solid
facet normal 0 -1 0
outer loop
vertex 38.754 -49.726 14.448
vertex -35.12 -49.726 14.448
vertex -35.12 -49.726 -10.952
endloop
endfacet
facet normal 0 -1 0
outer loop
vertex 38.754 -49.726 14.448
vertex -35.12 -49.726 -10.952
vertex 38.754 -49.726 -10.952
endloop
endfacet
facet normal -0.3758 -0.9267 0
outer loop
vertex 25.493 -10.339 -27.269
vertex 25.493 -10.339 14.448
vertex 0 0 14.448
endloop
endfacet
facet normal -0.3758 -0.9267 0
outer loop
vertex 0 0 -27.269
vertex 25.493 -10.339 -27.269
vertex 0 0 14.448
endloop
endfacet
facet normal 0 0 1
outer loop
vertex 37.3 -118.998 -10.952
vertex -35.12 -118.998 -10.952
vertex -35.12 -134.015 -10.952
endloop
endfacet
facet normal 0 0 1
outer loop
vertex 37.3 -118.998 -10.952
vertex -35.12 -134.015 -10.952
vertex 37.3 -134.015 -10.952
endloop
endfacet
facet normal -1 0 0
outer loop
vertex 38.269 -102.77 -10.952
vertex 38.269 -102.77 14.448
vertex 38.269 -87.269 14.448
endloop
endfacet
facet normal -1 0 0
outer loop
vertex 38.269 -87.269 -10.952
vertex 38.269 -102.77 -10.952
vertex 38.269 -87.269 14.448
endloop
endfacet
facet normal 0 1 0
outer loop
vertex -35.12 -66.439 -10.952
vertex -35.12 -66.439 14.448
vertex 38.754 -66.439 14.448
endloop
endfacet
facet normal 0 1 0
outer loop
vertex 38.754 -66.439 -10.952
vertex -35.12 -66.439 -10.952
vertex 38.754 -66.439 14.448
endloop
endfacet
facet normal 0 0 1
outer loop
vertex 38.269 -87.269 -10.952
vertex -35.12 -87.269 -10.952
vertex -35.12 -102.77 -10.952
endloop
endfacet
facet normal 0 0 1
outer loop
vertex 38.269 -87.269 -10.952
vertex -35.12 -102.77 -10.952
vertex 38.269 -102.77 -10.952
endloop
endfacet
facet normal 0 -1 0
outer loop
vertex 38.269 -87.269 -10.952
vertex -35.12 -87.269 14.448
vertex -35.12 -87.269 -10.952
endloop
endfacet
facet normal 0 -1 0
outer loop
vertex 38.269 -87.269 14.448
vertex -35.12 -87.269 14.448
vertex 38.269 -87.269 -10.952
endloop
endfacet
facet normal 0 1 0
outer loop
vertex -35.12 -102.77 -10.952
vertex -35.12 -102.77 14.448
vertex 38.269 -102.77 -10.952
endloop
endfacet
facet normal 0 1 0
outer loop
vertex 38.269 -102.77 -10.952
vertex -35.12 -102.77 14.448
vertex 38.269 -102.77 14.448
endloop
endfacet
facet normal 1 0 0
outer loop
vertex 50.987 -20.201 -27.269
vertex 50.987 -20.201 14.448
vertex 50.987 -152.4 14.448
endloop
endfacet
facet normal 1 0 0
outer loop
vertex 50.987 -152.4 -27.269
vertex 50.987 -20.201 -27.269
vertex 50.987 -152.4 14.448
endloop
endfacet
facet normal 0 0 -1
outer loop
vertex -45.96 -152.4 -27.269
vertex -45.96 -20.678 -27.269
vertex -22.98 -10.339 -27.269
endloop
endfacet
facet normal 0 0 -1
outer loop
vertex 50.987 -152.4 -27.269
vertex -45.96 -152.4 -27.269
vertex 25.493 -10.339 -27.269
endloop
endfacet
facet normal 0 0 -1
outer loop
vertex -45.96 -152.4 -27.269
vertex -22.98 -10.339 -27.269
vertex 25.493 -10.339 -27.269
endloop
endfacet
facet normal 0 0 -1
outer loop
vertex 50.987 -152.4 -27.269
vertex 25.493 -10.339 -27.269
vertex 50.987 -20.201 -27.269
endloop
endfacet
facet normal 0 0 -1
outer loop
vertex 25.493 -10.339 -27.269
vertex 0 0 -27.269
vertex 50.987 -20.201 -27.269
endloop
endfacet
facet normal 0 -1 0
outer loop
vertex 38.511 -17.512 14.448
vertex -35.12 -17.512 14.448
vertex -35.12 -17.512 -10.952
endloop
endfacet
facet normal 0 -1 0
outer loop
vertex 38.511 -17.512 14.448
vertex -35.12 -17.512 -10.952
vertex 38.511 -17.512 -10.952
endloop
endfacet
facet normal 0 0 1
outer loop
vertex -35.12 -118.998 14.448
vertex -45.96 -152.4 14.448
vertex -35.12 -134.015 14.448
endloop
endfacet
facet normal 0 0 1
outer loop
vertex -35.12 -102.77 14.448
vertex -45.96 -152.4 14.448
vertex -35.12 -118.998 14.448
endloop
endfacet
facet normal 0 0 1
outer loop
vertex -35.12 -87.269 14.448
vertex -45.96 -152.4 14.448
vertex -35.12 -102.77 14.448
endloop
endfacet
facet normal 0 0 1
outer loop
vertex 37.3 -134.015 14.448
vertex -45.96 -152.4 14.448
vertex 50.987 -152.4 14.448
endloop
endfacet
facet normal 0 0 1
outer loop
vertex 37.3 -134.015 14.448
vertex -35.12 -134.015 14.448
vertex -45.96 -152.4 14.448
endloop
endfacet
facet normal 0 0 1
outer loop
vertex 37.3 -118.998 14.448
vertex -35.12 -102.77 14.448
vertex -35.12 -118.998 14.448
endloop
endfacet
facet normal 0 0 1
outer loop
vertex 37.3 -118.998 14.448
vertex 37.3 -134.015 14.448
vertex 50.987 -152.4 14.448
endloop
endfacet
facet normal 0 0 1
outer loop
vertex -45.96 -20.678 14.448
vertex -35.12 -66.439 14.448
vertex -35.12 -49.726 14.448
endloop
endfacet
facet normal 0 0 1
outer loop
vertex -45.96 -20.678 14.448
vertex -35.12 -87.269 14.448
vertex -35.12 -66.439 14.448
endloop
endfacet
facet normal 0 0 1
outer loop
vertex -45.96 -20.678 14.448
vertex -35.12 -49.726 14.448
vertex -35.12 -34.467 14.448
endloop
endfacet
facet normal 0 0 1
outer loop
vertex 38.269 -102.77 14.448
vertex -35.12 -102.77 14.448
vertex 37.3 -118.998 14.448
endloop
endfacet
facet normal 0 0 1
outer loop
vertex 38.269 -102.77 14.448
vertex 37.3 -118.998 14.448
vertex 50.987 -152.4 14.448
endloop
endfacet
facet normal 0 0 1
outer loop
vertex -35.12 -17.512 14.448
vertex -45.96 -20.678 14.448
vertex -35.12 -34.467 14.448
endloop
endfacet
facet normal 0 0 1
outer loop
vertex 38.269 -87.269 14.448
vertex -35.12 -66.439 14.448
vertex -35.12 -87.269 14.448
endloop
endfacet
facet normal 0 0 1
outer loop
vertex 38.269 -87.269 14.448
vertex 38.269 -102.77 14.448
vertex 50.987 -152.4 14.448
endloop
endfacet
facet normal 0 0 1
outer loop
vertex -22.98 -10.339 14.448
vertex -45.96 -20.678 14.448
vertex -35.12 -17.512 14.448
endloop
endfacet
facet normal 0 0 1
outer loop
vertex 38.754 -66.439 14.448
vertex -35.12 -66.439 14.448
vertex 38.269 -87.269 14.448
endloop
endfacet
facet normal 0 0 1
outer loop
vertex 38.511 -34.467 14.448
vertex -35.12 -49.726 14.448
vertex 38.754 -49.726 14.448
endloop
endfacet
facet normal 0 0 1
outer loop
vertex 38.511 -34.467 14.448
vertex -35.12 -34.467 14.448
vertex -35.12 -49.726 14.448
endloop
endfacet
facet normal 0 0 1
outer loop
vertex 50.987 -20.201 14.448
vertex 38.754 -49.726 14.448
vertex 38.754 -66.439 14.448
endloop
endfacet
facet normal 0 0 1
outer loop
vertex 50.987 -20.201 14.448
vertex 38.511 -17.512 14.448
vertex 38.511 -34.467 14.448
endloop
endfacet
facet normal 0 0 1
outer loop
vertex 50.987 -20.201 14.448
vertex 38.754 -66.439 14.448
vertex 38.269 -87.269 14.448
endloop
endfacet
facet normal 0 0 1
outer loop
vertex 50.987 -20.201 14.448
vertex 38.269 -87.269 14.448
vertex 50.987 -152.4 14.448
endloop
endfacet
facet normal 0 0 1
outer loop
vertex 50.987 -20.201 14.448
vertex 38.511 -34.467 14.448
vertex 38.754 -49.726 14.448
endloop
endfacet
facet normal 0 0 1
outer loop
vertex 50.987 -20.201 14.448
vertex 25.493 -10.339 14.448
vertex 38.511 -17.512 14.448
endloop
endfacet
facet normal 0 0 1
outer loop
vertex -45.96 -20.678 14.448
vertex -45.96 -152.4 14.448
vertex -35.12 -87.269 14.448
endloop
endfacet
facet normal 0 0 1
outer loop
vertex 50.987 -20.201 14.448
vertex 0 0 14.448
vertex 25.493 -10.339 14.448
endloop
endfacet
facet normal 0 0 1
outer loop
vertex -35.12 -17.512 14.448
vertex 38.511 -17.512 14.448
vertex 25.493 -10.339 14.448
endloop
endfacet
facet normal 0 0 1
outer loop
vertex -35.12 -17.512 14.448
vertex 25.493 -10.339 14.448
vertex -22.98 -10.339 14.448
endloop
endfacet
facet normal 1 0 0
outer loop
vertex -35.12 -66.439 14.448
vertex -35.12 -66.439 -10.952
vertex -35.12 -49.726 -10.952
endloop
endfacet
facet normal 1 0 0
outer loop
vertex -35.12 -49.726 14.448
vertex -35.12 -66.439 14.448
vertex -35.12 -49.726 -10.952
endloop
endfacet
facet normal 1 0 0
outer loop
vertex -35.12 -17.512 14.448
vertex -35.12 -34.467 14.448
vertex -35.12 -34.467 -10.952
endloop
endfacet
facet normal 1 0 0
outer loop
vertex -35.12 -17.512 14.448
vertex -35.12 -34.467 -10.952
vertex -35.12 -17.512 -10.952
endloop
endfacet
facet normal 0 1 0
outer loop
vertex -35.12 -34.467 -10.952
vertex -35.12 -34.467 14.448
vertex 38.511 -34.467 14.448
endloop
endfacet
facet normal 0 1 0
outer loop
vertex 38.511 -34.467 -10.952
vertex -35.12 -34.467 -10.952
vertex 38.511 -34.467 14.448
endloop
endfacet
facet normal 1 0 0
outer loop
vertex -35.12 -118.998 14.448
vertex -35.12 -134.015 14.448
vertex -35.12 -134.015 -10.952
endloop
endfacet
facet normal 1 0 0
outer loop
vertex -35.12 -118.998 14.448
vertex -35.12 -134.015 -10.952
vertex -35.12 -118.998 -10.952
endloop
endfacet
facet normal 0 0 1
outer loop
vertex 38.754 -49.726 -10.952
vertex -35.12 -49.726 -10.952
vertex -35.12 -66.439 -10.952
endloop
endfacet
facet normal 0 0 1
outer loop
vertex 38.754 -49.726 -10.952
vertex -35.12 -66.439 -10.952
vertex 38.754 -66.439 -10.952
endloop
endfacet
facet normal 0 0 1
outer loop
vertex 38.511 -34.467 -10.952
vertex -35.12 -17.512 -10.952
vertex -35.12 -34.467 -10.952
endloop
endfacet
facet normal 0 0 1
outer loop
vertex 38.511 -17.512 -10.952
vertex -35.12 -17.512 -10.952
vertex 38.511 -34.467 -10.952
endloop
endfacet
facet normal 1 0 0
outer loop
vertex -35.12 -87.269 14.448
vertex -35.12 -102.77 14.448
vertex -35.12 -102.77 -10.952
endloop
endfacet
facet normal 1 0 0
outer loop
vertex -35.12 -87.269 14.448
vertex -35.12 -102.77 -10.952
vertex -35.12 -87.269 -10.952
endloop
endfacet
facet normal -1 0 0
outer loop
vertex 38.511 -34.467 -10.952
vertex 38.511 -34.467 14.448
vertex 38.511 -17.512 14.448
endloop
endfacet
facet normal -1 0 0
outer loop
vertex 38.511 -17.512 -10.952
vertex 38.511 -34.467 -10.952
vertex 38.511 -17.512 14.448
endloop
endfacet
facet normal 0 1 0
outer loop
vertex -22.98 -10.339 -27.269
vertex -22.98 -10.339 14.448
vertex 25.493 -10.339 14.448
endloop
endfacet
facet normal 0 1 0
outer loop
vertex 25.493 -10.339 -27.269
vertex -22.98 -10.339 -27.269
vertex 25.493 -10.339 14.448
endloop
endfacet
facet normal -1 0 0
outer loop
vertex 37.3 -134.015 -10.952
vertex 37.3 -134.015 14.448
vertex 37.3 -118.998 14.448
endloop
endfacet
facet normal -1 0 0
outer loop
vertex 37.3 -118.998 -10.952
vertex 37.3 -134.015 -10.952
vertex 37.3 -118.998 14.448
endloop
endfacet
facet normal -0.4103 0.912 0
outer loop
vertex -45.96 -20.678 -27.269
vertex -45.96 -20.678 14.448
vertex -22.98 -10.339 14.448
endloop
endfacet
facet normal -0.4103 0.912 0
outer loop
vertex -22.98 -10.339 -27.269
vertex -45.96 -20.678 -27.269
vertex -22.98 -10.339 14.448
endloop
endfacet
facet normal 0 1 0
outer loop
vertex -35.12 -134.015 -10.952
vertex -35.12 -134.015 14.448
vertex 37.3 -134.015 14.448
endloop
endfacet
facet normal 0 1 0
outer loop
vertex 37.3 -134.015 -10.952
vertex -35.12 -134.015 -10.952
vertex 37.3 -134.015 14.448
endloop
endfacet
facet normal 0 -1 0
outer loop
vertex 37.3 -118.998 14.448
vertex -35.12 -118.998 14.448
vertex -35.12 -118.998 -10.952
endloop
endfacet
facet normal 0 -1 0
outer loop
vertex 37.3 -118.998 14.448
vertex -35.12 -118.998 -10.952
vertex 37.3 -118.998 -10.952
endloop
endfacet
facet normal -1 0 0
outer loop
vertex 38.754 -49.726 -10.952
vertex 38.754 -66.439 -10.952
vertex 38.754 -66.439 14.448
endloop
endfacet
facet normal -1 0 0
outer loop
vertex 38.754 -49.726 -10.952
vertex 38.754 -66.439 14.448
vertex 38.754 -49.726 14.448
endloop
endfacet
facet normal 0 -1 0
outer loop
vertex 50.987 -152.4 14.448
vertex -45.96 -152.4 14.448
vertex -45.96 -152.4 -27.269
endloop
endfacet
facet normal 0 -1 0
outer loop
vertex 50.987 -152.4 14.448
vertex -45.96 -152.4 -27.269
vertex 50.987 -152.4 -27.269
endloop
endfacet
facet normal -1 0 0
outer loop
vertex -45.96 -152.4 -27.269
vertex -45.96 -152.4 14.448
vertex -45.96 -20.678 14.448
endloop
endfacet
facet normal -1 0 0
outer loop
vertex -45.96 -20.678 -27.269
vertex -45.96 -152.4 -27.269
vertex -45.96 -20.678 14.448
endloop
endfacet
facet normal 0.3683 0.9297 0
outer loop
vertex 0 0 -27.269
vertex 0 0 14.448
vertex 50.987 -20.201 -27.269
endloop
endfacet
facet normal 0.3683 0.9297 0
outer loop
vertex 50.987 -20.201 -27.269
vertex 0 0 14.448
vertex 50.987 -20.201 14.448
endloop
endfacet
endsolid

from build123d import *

# Parameters (mm, degrees)
F0_W      = 129.2205303907
F0_H      = 41.7168587446
F1_DEPTH  = 152.4
F2_W      = 73.6317485571
F2_H      = 16.954690218
F2_W_2    = 73.8739818335
F2_H_2    = 16.7124718428
F3_DEPTH  = 25.4
F5_DEPTH  = 41.7178587446
F6_W      = 73.389545083
F6_H      = 15.5014246702
F7_DEPTH  = 25.4
F8_W      = 72.4207013845
F8_H      = 15.017002821
F9_DEPTH  = 25.4
F11_DEPTH = 75.7919326425
F13_DEPTH = 105.4396703839
F15_DEPTH = 137.5292986631


with BuildPart() as f1:
    # F0 (on Front) → F1 (new body)
    with BuildSketch(Plane.XZ):
        with Locations((-0.3052428365, -6.4101442695)):
            Rectangle(F0_W, F0_H)
    extrude(amount=F1_DEPTH)

    # F2 (on face) → F3 (cut)
    with BuildSketch(Plane.XY.offset(14.4482851028)):
        with Locations((1.6954615712, -25.9895175695)):
            Rectangle(F2_W, F2_H)
        with Locations((1.8165782094, -58.0823048949)):
            Rectangle(F2_W_2, F2_H_2)
    extrude(amount=-F3_DEPTH, mode=Mode.SUBTRACT)

    # F4 (on face) → F5 (cut, through all)
    with BuildSketch(Plane.XY.offset(14.4482851028)):
        Polygon((64.3050223589, 0), (0, 0), (64.3050223589, -25.4777166992), align=None)
        Polygon((-64.9155080318, 0), (-64.9155080318, -29.2058624327), (0, 0), align=None)
    extrude(amount=-F5_DEPTH, mode=Mode.SUBTRACT)

    # F6 (on face) → F7 (cut)
    with BuildSketch(Plane.XY.offset(14.4482851028)):
        with Locations((1.5743598342, -95.0192883611)):
            Rectangle(F6_W, F6_H)
    extrude(amount=-F7_DEPTH, mode=Mode.SUBTRACT)

    # F8 (on face) → F9 (cut)
    with BuildSketch(Plane.XY.offset(14.4482851028)):
        with Locations((1.0899379849, -126.5065521002)):
            Rectangle(F8_W, F8_H)
    extrude(amount=-F9_DEPTH, mode=Mode.SUBTRACT)

    # F10 (on face) → F11 (cut)
    with BuildSketch(Plane.XY.offset(14.4482851028)):
        Polygon((64.3050223589, -25.4777166992), (50.9865237329, -20.2009137), (50.9865237329, -152.4), align=None)
        Polygon((64.3050223589, -25.4777166992), (50.9865237329, -152.4), (64.3050223589, -152.4), align=None)
    extrude(amount=-F11_DEPTH, mode=Mode.SUBTRACT)

    # F12 (on face) → F13 (cut)
    with BuildSketch(Plane.XY.offset(14.4482851028)):
        Polygon((-45.9601895189, -152.4), (-45.9601895189, -20.677755026), (-64.9155080318, -29.2058624327), (-64.9155080318, -152.4), align=None)
    extrude(amount=-F13_DEPTH, mode=Mode.SUBTRACT)

    # F14 (on face) → F15 (cut)
    with BuildSketch(Plane.XY.offset(14.4482851028)):
        Polygon((0, 0), (-22.9800947595, -10.338877513), (25.4932618665, -10.338877513), align=None)
    extrude(amount=-F15_DEPTH, mode=Mode.SUBTRACT)


solid = f1.part
